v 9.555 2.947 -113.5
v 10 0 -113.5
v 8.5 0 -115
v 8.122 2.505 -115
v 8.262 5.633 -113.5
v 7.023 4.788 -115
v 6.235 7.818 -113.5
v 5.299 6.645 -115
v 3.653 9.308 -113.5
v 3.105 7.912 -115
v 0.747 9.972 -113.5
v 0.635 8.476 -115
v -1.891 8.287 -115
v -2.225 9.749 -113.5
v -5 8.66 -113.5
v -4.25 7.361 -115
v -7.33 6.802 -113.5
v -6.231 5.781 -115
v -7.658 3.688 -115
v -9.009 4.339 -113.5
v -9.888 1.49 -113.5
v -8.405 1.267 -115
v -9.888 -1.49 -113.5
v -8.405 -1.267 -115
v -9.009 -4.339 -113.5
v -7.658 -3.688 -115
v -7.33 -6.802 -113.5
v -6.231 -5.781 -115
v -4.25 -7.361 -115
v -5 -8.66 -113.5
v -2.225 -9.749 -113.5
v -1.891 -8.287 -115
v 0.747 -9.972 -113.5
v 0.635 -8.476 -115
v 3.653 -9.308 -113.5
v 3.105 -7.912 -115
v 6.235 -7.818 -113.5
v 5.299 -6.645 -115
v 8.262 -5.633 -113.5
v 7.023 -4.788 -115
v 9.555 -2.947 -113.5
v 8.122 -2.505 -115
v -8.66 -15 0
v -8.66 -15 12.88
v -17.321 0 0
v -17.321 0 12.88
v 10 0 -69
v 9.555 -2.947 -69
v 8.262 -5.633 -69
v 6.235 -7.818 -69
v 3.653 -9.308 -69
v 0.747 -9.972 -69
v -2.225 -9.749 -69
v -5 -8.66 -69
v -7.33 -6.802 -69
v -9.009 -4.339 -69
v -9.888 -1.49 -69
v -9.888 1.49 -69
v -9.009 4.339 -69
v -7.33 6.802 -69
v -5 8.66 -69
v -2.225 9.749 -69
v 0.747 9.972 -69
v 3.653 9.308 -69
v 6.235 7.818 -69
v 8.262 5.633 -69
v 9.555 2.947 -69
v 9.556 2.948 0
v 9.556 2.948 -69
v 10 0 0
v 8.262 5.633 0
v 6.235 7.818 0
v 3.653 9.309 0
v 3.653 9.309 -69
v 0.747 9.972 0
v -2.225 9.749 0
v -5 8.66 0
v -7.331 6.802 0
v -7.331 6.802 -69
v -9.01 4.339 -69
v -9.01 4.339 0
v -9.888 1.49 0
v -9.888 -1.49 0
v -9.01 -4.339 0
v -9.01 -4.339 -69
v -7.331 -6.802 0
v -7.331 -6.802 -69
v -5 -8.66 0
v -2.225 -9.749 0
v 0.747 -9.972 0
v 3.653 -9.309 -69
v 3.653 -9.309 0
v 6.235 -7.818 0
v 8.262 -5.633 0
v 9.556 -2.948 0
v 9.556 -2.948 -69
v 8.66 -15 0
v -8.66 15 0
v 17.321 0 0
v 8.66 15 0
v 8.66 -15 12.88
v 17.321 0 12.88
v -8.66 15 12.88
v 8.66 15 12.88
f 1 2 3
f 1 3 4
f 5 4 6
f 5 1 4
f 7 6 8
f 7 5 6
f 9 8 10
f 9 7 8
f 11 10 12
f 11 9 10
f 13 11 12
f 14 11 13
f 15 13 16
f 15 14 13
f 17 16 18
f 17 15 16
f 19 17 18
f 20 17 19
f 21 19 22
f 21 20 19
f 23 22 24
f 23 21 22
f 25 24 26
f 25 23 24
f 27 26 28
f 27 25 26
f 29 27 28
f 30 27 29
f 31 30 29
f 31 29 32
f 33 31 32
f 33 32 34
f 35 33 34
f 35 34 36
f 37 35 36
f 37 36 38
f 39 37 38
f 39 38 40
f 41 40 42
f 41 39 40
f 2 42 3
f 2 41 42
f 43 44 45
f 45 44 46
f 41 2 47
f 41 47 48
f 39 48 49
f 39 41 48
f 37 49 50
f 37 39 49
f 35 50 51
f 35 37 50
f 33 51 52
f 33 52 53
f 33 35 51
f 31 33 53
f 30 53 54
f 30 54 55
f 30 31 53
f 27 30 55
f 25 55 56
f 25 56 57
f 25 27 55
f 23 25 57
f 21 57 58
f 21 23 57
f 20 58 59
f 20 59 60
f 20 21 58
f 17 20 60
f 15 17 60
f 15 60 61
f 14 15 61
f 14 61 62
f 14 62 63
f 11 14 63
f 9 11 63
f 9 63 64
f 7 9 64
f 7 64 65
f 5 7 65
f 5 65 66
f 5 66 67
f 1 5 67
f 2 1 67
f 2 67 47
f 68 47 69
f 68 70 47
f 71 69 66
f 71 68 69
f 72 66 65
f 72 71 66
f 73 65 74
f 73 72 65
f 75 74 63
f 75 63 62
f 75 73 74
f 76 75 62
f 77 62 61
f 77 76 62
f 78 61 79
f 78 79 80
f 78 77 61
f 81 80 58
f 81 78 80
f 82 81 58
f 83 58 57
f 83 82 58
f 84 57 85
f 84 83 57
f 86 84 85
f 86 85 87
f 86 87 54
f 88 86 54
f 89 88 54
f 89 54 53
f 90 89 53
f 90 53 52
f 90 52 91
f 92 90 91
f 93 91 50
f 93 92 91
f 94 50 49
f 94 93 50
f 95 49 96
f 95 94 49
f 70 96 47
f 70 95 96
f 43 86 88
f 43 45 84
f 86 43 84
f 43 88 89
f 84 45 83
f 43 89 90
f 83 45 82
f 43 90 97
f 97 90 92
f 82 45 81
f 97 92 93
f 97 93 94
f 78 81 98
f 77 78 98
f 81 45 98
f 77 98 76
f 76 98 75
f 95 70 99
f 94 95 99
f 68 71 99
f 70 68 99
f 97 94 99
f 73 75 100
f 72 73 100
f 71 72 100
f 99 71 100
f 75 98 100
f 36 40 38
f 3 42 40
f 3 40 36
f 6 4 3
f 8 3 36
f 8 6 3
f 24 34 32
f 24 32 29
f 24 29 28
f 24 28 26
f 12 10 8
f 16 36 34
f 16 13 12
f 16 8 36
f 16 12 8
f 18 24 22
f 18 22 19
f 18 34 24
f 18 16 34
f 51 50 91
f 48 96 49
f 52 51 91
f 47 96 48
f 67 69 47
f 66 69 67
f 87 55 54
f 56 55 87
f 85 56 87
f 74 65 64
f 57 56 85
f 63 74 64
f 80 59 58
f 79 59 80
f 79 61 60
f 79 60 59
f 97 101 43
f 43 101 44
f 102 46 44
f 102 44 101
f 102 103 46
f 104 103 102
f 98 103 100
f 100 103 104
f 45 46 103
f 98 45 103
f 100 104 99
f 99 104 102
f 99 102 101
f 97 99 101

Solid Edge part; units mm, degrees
sketch "Sketch1" plane through (0, 0, 0) normal (0, 0, 1) x (1, 0, 0)
  circle A0 centre (0, 0) radius 17.4
  dimension "D1" = 34.8
extrude "Protrusion1" add sketch "Sketch1" along normal blind 12.88
sketch "Sketch2" plane through (0, 0, 0) normal (0, 0, -1) x (1, 0, 0)
  circle A0 centre (0, 0) radius 10
extrude "Protrusion2" add sketch "Sketch2" along normal blind 115
sketch "Sketch3" plane through (0, 0, -115) normal (0, 0, -1) x (1, 0, 0)
  circle A0 centre (0, 0) radius 9.9997
extrude "Cutout1" cut sketch "Sketch3" against normal blind 46 flip side to cut
chamfer "Chamfer_1" distance 1.5 angle 45 1 edges at (-9.9997, 0, -115)
sketch "Sketch4" plane through (0, 0, 12.88) normal (0, 0, 1) x (1, 0, 0)
  line L0 (-8.8182, 15) -> (8.8182, 15)
  dimension "D1" = 30
extrude "Cutout2" cut sketch "Sketch4" against normal up to next material side at (0, 15.05, 12.88)
pattern_circular "Pattern1" count 6 over 360 about axis through (0, 0, 12.88) along (0, 0, 1) of "Cutout2"
properties part number "160787"
